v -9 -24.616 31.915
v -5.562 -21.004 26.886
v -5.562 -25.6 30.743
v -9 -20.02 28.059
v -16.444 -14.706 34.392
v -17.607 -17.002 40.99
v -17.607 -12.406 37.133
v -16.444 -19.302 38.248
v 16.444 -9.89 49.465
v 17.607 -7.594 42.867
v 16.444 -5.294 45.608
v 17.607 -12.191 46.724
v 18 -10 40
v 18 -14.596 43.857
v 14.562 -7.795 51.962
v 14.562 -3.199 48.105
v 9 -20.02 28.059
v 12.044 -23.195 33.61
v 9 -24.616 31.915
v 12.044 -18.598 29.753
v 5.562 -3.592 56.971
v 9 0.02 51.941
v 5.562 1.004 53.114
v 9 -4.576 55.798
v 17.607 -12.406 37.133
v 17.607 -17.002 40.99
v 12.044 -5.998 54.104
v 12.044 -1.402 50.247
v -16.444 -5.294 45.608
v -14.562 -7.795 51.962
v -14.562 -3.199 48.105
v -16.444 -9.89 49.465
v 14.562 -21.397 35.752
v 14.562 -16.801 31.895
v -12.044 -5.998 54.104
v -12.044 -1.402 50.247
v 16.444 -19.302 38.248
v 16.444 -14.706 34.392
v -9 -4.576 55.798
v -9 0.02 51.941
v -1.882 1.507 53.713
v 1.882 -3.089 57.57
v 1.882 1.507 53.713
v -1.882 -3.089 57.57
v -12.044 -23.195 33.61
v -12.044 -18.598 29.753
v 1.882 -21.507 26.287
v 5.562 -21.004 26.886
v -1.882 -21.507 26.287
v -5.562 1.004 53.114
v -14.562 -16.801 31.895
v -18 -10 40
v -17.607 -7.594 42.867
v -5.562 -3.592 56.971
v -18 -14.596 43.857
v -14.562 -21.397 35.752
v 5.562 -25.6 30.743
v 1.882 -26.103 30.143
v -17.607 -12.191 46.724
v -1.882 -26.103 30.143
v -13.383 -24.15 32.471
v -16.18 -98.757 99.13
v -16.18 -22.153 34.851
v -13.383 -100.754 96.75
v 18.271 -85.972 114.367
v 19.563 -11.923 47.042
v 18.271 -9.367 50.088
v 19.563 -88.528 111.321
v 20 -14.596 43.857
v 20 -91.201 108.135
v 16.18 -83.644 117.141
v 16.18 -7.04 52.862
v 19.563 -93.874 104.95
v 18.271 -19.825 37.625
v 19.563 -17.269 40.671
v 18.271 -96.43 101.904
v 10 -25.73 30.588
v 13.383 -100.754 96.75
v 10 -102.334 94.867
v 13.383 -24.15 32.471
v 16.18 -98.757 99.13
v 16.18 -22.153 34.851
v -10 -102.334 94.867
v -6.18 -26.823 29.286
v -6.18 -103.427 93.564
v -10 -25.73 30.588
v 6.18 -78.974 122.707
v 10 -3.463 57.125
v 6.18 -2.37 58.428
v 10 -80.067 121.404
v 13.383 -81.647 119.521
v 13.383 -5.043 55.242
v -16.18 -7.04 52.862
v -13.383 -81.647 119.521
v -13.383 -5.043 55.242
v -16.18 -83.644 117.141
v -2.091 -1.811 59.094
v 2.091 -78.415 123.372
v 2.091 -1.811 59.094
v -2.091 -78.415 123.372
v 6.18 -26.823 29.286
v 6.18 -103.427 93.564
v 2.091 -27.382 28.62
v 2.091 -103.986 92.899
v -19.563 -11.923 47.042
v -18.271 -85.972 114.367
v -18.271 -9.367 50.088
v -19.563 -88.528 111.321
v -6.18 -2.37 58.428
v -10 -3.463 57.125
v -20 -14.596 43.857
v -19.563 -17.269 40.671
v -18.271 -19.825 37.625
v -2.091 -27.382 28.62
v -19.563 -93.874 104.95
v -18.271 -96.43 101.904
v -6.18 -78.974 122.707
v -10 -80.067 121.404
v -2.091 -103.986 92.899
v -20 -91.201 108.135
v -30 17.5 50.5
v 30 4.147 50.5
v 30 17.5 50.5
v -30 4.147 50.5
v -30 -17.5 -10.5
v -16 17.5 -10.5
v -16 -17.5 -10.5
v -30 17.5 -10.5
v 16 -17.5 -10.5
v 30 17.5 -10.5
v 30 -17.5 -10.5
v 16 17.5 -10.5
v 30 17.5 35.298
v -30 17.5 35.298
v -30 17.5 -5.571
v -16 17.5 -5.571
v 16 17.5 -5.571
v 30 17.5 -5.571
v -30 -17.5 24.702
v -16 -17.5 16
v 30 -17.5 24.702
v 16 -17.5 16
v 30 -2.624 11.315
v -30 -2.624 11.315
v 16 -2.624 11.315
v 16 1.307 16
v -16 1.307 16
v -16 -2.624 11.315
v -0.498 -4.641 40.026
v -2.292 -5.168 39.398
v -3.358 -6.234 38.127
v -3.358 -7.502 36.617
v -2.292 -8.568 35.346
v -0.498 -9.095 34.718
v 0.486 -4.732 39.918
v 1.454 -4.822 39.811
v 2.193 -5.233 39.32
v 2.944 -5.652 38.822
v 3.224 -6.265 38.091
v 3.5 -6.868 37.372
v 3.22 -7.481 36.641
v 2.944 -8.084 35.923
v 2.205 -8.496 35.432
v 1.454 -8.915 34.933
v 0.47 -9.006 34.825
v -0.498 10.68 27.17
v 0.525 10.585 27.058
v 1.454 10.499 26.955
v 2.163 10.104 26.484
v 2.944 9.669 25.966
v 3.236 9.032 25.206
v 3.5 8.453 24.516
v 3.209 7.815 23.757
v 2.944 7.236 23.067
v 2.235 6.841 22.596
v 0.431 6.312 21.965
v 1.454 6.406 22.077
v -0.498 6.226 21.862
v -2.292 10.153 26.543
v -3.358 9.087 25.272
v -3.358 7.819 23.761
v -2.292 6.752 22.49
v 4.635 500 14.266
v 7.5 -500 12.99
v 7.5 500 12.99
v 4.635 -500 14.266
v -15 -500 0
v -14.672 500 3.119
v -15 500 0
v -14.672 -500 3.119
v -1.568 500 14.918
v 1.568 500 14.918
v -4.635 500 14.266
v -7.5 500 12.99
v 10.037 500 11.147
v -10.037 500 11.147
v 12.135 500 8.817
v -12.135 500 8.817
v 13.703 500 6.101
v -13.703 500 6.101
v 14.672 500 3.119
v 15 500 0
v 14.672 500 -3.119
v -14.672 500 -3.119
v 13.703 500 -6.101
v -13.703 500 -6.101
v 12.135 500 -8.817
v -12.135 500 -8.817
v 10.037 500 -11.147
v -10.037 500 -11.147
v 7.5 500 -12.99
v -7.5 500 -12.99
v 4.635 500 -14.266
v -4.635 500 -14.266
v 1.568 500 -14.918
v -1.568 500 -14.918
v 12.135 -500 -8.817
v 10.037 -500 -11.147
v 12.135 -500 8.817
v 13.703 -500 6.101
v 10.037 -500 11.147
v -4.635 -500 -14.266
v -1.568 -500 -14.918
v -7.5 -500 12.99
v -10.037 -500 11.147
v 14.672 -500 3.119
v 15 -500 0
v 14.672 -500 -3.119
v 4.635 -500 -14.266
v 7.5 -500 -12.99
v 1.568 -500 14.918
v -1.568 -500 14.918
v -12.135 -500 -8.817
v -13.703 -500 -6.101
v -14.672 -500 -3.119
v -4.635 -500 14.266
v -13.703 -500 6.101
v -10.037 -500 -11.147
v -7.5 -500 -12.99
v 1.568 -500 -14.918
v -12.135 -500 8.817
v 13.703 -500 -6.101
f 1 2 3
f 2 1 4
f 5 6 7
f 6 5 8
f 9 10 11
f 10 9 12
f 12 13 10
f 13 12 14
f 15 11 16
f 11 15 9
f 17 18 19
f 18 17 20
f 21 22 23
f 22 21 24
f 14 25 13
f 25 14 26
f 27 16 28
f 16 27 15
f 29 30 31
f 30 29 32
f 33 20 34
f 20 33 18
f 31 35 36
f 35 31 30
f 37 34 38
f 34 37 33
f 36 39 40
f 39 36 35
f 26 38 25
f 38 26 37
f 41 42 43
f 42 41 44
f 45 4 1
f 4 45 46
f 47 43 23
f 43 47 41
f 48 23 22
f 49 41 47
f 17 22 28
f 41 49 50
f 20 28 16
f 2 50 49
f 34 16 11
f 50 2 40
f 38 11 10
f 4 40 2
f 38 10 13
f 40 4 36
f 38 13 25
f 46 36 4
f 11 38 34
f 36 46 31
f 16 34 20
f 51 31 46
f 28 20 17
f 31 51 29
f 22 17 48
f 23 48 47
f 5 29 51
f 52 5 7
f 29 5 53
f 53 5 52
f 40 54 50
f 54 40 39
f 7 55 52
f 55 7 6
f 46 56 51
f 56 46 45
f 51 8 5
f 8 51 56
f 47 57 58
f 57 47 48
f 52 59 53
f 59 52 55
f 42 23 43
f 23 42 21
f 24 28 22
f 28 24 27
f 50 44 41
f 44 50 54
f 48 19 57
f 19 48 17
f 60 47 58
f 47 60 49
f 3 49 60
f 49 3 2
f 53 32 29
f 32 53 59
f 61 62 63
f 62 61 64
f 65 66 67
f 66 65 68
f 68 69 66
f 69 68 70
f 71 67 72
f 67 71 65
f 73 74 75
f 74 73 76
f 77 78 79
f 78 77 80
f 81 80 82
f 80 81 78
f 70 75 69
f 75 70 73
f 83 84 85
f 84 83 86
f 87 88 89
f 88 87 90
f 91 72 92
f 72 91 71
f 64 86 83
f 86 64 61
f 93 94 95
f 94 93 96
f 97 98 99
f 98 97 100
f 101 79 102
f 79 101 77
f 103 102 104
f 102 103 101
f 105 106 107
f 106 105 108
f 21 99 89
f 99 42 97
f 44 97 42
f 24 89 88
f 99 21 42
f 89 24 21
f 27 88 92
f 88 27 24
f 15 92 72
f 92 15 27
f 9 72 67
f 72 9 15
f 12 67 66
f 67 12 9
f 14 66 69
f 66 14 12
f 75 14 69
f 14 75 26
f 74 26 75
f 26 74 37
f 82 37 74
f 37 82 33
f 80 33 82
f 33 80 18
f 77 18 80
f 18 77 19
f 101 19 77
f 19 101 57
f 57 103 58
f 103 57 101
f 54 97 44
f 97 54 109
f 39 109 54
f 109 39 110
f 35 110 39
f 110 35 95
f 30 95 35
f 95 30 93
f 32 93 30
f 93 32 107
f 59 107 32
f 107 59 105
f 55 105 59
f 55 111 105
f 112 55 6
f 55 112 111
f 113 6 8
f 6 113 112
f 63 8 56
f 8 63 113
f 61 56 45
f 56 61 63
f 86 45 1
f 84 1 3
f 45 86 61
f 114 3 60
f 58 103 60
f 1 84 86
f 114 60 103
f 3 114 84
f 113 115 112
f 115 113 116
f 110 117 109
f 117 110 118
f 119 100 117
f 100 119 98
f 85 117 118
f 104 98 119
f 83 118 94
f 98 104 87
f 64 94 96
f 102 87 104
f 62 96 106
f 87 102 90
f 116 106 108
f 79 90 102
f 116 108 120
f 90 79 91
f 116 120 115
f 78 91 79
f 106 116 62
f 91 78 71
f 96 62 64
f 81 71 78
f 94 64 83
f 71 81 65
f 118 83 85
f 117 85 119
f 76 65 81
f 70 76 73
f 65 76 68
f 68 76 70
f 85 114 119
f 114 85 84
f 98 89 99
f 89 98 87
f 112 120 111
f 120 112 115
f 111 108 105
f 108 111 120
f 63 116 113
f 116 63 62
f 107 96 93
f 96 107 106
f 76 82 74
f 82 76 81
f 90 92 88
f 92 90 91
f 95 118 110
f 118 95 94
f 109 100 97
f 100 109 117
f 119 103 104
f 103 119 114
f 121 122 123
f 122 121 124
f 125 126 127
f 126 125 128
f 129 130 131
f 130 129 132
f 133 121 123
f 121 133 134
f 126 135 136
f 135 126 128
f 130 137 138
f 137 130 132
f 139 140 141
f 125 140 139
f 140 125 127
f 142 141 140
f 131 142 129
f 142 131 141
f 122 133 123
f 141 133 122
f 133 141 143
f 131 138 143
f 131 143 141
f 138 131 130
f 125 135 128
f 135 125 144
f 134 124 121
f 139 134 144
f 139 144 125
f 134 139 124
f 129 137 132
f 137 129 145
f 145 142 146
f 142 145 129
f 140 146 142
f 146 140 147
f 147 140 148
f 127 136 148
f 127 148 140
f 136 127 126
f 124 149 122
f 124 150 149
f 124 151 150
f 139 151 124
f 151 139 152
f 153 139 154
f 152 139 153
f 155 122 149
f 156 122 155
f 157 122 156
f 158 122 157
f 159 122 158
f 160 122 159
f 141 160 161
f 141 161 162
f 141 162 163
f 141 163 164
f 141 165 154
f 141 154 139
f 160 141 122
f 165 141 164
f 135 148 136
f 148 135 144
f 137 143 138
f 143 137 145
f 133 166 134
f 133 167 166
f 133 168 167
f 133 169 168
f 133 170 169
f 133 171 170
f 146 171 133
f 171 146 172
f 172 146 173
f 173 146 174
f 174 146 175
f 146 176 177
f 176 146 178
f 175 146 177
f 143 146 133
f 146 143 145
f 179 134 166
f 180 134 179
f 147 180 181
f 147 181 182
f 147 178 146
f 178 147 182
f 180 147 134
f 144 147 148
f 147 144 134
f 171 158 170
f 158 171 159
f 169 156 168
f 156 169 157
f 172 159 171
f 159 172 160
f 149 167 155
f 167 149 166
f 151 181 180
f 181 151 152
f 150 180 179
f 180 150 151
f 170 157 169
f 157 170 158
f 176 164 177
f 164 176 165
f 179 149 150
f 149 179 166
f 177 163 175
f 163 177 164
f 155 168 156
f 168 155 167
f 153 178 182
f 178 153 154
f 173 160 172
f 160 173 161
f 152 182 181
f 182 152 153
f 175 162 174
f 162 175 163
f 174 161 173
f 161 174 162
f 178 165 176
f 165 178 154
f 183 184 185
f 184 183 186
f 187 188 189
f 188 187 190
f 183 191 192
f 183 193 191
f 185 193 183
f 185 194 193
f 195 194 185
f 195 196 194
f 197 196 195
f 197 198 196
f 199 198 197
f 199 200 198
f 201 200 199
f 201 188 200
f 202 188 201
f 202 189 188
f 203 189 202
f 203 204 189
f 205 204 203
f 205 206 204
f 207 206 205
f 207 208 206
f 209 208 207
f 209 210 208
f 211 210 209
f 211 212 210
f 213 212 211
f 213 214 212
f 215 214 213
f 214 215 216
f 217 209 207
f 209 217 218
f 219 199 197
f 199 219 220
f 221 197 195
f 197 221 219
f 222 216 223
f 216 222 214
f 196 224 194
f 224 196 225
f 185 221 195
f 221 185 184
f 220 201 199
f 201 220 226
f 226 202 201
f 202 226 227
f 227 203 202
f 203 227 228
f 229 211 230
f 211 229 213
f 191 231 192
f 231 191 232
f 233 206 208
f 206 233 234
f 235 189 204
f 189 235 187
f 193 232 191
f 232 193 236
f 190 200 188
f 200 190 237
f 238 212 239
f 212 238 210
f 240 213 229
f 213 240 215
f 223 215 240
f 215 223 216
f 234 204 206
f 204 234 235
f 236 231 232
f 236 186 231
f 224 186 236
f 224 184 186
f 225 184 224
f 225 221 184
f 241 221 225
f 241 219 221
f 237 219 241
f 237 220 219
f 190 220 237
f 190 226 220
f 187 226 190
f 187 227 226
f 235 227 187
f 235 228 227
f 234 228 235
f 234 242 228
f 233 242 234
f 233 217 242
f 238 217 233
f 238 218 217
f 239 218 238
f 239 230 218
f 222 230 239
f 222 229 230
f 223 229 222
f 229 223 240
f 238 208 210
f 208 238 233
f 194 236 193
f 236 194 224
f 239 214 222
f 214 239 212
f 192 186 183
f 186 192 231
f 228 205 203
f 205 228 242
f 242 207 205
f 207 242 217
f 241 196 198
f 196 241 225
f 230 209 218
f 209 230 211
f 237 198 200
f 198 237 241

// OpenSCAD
handle_width = 36;
thin_handle_len = 6;
pole_width = 30;
block_y = 35;
block_z = 61;
block_x = 164;
handle_angle = 50;
handle_centerpoint = [0, -10, 40];

color(alpha=0.5)
rotate([90, 0, 0])
cylinder(h=1000, d=pole_width, center=true)
	;

color(alpha=0.5)
translate(handle_centerpoint)
rotate([handle_angle, 0, 0])
union() {
	cylinder(h=100, d=handle_width)
		;
	translate([0, 0, thin_handle_len])
	cylinder(h=100, d=handle_width + 4)
		;
}

color(alpha=0.5)
difference() {
	translate([0, 0, 20])
	intersection() {
		cube([block_x, block_y, block_z], center=true)
			;
		cube([pole_width * 2, 999, 999], center=true)
			;
	}
	cube([pole_width + 2, 999, pole_width + 2], center=true)
		;
	translate([0, 0, 30])
	rotate([90 + handle_angle, 0, 0])
	translate([-99, 10, -99])
	cube([999, 999, 999])
		;
	translate([0, 0, 30])
	rotate([270 + handle_angle, 0, 0])
	translate([-99, 10, -0.5 * (pole_width + 2)])
	cube([999, 999, pole_width + 2])
		;
	translate(handle_centerpoint)
	rotate([handle_angle, 0, 0])
	cylinder(h=999, d=7, center=true)
		;
}
